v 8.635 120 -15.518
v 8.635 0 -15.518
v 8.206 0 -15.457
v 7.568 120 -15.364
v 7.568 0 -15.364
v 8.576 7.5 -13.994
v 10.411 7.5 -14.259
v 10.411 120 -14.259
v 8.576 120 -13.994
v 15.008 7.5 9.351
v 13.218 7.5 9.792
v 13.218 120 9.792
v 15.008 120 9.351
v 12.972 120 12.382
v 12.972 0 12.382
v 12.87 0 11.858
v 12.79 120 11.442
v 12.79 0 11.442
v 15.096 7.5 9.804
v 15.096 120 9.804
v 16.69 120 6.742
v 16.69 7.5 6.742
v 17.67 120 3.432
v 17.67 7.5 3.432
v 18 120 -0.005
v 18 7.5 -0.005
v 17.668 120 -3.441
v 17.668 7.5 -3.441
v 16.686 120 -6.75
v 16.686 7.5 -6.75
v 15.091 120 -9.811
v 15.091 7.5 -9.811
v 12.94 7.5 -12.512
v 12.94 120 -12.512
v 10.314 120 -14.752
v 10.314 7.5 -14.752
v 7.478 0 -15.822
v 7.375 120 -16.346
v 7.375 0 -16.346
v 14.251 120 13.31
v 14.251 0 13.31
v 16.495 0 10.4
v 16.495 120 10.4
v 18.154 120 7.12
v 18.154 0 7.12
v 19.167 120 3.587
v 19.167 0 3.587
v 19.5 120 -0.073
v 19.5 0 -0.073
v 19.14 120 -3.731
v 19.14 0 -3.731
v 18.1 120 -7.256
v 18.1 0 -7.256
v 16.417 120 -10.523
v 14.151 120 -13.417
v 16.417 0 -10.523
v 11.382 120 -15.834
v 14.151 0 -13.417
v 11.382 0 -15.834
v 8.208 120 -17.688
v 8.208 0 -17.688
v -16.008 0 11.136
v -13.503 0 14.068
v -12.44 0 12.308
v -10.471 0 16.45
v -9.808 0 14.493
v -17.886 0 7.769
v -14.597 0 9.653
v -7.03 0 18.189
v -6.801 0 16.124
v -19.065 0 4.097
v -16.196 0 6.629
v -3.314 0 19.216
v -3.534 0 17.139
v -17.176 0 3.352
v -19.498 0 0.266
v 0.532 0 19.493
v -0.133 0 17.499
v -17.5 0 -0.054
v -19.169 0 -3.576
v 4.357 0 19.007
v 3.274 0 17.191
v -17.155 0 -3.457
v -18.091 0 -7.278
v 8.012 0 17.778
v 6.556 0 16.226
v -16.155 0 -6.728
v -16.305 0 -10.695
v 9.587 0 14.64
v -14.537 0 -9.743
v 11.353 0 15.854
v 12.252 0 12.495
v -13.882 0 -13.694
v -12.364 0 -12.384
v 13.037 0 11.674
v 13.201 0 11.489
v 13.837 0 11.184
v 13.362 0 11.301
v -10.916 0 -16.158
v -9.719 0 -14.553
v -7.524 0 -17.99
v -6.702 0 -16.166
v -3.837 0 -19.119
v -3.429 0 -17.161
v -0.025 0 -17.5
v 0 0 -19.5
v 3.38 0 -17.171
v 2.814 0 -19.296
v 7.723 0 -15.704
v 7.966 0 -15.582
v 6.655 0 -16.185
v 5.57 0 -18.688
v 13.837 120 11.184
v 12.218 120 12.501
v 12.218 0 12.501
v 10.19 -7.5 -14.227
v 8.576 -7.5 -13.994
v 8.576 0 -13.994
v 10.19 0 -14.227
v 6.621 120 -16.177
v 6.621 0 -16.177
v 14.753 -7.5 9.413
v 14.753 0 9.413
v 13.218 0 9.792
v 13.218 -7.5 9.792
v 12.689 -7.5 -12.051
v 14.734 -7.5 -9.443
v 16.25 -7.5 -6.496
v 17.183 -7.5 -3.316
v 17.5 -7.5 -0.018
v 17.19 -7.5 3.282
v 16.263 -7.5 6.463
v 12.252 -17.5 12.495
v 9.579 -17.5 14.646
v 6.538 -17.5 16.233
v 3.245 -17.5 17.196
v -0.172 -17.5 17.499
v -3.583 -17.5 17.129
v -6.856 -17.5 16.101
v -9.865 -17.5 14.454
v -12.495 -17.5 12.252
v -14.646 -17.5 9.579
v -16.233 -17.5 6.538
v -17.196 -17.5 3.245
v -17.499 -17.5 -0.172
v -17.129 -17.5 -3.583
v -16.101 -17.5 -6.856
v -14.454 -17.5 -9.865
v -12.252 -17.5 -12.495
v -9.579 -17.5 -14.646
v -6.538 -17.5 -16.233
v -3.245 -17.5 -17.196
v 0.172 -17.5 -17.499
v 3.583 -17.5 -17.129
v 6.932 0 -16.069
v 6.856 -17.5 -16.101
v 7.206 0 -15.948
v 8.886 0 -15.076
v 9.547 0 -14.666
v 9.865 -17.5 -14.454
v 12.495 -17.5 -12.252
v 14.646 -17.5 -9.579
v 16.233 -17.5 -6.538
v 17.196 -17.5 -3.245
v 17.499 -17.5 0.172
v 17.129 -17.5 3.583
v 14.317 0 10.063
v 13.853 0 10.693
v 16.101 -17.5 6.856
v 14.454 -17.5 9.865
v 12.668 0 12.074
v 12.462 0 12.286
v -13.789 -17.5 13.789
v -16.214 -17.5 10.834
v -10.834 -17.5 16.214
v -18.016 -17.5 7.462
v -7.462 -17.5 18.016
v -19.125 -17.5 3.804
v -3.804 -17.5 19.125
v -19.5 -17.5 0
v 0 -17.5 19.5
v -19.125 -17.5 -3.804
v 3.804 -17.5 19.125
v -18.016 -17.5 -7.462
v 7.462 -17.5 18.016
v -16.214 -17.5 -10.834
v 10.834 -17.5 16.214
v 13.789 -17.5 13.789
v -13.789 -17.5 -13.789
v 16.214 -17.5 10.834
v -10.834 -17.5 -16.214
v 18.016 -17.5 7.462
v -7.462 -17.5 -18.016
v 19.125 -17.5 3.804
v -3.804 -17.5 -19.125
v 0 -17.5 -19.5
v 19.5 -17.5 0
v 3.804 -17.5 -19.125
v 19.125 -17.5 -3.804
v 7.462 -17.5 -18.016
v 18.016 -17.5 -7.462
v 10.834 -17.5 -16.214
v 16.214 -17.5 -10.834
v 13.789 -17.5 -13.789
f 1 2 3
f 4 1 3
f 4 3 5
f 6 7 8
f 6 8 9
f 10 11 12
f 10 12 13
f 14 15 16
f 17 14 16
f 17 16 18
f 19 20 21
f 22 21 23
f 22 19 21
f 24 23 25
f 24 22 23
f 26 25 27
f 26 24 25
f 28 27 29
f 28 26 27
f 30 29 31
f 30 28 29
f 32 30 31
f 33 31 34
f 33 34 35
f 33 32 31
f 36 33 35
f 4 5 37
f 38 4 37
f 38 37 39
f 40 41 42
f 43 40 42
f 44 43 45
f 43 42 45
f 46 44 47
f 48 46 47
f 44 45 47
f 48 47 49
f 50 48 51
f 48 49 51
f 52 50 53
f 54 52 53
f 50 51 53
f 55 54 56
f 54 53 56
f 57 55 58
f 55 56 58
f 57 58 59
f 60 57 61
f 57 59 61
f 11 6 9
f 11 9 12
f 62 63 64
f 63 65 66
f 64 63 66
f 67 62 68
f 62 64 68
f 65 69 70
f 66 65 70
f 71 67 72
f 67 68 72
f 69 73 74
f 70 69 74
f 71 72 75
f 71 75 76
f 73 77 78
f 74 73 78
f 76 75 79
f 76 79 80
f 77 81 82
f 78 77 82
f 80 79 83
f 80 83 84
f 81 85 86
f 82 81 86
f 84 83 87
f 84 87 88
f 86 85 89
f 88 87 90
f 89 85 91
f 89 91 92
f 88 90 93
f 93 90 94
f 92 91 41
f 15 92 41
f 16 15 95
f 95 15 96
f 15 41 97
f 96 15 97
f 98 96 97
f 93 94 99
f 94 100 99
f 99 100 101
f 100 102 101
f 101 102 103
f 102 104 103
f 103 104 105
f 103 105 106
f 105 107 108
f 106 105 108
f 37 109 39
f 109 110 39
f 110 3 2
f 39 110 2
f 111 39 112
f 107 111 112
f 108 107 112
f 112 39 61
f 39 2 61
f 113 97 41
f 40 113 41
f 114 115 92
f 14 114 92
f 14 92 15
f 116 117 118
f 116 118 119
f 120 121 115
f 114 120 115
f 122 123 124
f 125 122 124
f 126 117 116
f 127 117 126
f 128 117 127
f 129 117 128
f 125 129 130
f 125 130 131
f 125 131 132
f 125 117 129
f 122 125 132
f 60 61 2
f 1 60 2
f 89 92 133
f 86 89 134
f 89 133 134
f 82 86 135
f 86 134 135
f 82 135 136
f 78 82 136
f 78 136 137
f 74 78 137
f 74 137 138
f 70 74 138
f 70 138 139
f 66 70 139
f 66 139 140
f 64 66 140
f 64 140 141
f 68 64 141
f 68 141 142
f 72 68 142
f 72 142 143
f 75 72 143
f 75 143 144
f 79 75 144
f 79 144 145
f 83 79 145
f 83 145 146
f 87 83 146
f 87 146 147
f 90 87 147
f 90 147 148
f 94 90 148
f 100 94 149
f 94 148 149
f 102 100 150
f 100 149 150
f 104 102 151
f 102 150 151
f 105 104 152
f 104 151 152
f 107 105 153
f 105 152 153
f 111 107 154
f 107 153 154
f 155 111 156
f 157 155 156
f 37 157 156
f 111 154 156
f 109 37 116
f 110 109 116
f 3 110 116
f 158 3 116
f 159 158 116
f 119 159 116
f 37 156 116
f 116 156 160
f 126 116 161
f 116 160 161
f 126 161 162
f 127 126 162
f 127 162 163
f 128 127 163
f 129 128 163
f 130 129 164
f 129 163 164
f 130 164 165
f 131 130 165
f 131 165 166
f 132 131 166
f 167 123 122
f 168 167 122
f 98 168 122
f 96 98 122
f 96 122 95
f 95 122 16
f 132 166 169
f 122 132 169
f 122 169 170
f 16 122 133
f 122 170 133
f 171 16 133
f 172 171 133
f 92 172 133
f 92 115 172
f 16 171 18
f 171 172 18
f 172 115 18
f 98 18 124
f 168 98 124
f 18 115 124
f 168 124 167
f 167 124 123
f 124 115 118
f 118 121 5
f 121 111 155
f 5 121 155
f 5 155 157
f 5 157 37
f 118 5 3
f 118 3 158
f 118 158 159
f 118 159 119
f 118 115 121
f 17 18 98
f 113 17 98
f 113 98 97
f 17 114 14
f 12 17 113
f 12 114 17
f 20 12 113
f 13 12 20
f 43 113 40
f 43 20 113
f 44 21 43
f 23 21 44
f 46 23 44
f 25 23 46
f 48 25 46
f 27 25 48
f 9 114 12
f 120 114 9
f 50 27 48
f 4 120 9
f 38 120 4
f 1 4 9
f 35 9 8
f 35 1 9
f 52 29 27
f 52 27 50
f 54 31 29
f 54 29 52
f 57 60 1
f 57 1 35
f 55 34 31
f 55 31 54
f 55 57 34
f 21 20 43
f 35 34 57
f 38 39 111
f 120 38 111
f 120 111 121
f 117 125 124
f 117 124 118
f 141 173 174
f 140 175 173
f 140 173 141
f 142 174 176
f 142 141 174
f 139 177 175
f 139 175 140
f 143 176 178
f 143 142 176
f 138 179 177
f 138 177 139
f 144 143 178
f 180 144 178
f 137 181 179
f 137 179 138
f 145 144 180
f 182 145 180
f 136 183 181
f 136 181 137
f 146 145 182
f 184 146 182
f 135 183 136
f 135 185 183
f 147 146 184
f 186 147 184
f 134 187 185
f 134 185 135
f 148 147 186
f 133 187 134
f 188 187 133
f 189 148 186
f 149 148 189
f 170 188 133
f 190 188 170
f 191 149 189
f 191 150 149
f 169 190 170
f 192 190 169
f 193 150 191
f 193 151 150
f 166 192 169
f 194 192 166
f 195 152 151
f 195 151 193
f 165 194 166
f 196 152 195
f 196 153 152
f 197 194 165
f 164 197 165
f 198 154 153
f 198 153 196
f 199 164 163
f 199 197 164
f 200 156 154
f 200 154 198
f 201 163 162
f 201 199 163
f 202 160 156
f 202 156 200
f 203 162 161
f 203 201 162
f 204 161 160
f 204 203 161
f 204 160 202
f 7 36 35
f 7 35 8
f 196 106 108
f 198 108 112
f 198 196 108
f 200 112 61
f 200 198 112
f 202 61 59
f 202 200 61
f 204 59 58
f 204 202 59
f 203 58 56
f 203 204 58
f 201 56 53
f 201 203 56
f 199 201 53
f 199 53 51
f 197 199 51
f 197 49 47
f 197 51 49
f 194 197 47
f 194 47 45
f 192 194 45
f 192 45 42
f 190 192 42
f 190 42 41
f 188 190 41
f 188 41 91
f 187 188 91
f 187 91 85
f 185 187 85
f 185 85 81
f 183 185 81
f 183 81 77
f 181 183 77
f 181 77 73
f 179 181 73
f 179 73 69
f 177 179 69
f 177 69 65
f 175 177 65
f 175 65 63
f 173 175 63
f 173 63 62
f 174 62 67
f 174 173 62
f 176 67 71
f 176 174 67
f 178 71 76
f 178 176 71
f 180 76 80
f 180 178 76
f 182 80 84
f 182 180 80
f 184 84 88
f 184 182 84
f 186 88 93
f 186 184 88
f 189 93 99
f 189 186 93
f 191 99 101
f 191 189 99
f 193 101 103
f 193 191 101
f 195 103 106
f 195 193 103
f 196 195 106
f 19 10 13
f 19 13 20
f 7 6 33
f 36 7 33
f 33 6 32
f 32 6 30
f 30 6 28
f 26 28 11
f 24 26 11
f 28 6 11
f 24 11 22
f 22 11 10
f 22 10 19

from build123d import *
from build123d.topology import SkipClean

# Parameters (mm, degrees)
BOSS_EXTRUDE1_DEPTH = 120
BOSS_EXTRUDE3_DEPTH = 7.5
BOSS_EXTRUDE2_START = 17.5
SKETCH26_R          = 19.5
SKETCH26_R_2        = 17.5
BOSS_EXTRUDE2_DEPTH = 17.5


with BuildPart() as part:
    # Sketch12 → Boss-Extrude1 (new body)
    with BuildSketch(Plane(origin=(0, 0, 0), x_dir=(1, 0, 0), z_dir=(0, 1, 0))):
        with BuildLine():
            Line((13.836638735, -11.183931196), (14.250877044, -13.310240549))
            ThreePointArc((14.250877044, -13.310240549), (19.139762737, 3.730882249), (8.20840412, 17.688191027))
            Line((8.20840412, 17.688191027), (8.634693417, 15.51841097))
            Line((8.634693417, 15.51841097), (7.567993782, 15.364331637))
            Line((7.567993782, 15.364331637), (7.375159644, 16.345842711))
            Line((7.375159644, 16.345842711), (6.621374847, 16.1773853))
            Line((6.621374847, 16.1773853), (12.217996211, -12.500838715))
            Line((12.217996211, -12.500838715), (12.971781009, -12.381940525))
            Line((12.971781009, -12.381940525), (12.790172439, -11.44177067))
            Line((12.790172439, -11.44177067), (13.836638735, -11.183931196))
        make_face()
        with BuildLine():
            ThreePointArc((15.095946542, -9.80369308), (17.668094122, 3.440704885), (10.313934488, 14.752042414))
            Line((10.313934488, 14.752042414), (10.410725736, 14.259382331))
            Line((10.410725736, 14.259382331), (8.575701021, 13.994322351))
            Line((8.575701021, 13.994322351), (13.217578727, -9.79160134))
            Line((13.217578727, -9.79160134), (15.007665389, -9.350540786))
            Line((15.007665389, -9.350540786), (15.095946542, -9.80369308))
        make_face(mode=Mode.SUBTRACT)
    extrude(amount=BOSS_EXTRUDE1_DEPTH)

    # Sketch28 → Boss-Extrude3 (add, symmetric)
    with BuildSketch(Plane.XZ):
        with BuildLine():
            Line((10.410725736, -14.259382331), (10.313927689, -14.752054328))
            ThreePointArc((10.313927689, -14.752054328), (17.668099364, -3.44070867), (15.095947667, 9.803702123))
            Line((15.095947667, 9.803702123), (15.007665389, 9.350540786))
            Line((15.007665389, 9.350540786), (13.217574825, 9.791607451))
            Line((13.217574825, 9.791607451), (8.575695107, -13.994326549))
            Line((8.575695107, -13.994326549), (10.410725736, -14.259382331))
        make_face()
    extrude(amount=BOSS_EXTRUDE3_DEPTH, both=True)

    # Sketch26 → Boss-Extrude2 (add)
    with SkipClean():  # the faces are left unmerged after this step: merging them gives an invalid solid
        with BuildSketch(Plane.XZ.offset(BOSS_EXTRUDE2_START)):
            with Locations(Location((0, 0, 0), (0, 0, 270))):
                Circle(SKETCH26_R)
            with Locations(Location((0, 0, 0), (0, 0, 45.563469932))):
                Circle(SKETCH26_R_2, mode=Mode.SUBTRACT)
        extrude(amount=-BOSS_EXTRUDE2_DEPTH)


solid = part.part
